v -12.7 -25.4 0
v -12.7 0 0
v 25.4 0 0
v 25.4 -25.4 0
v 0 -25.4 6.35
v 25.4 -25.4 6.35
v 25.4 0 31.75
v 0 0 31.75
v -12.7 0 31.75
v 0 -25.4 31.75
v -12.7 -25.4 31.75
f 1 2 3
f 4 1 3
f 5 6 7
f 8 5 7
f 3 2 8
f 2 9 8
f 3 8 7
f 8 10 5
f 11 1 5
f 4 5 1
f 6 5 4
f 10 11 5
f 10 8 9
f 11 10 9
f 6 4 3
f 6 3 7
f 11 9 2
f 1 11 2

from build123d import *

# Parameters (mm, degrees)
F1_DEPTH = 25.4
F3_DEPTH = 25.4


with BuildPart() as f1:
    # F0 (on Front) → F1 (new body)
    with BuildSketch(Plane.XZ):
        Polygon((-12.7, 0), (0, 0), (25.4, 0), (25.4, 31.75), (-12.7, 31.75), align=None)
    extrude(amount=F1_DEPTH)

    # F2 (on face) → F3 (cut)
    with BuildSketch(Plane.YZ.offset(25.4)):
        Polygon((-25.4, 31.75), (-25.4, 6.35), (0, 31.75), align=None)
    extrude(amount=-F3_DEPTH, mode=Mode.SUBTRACT)


solid = f1.part
